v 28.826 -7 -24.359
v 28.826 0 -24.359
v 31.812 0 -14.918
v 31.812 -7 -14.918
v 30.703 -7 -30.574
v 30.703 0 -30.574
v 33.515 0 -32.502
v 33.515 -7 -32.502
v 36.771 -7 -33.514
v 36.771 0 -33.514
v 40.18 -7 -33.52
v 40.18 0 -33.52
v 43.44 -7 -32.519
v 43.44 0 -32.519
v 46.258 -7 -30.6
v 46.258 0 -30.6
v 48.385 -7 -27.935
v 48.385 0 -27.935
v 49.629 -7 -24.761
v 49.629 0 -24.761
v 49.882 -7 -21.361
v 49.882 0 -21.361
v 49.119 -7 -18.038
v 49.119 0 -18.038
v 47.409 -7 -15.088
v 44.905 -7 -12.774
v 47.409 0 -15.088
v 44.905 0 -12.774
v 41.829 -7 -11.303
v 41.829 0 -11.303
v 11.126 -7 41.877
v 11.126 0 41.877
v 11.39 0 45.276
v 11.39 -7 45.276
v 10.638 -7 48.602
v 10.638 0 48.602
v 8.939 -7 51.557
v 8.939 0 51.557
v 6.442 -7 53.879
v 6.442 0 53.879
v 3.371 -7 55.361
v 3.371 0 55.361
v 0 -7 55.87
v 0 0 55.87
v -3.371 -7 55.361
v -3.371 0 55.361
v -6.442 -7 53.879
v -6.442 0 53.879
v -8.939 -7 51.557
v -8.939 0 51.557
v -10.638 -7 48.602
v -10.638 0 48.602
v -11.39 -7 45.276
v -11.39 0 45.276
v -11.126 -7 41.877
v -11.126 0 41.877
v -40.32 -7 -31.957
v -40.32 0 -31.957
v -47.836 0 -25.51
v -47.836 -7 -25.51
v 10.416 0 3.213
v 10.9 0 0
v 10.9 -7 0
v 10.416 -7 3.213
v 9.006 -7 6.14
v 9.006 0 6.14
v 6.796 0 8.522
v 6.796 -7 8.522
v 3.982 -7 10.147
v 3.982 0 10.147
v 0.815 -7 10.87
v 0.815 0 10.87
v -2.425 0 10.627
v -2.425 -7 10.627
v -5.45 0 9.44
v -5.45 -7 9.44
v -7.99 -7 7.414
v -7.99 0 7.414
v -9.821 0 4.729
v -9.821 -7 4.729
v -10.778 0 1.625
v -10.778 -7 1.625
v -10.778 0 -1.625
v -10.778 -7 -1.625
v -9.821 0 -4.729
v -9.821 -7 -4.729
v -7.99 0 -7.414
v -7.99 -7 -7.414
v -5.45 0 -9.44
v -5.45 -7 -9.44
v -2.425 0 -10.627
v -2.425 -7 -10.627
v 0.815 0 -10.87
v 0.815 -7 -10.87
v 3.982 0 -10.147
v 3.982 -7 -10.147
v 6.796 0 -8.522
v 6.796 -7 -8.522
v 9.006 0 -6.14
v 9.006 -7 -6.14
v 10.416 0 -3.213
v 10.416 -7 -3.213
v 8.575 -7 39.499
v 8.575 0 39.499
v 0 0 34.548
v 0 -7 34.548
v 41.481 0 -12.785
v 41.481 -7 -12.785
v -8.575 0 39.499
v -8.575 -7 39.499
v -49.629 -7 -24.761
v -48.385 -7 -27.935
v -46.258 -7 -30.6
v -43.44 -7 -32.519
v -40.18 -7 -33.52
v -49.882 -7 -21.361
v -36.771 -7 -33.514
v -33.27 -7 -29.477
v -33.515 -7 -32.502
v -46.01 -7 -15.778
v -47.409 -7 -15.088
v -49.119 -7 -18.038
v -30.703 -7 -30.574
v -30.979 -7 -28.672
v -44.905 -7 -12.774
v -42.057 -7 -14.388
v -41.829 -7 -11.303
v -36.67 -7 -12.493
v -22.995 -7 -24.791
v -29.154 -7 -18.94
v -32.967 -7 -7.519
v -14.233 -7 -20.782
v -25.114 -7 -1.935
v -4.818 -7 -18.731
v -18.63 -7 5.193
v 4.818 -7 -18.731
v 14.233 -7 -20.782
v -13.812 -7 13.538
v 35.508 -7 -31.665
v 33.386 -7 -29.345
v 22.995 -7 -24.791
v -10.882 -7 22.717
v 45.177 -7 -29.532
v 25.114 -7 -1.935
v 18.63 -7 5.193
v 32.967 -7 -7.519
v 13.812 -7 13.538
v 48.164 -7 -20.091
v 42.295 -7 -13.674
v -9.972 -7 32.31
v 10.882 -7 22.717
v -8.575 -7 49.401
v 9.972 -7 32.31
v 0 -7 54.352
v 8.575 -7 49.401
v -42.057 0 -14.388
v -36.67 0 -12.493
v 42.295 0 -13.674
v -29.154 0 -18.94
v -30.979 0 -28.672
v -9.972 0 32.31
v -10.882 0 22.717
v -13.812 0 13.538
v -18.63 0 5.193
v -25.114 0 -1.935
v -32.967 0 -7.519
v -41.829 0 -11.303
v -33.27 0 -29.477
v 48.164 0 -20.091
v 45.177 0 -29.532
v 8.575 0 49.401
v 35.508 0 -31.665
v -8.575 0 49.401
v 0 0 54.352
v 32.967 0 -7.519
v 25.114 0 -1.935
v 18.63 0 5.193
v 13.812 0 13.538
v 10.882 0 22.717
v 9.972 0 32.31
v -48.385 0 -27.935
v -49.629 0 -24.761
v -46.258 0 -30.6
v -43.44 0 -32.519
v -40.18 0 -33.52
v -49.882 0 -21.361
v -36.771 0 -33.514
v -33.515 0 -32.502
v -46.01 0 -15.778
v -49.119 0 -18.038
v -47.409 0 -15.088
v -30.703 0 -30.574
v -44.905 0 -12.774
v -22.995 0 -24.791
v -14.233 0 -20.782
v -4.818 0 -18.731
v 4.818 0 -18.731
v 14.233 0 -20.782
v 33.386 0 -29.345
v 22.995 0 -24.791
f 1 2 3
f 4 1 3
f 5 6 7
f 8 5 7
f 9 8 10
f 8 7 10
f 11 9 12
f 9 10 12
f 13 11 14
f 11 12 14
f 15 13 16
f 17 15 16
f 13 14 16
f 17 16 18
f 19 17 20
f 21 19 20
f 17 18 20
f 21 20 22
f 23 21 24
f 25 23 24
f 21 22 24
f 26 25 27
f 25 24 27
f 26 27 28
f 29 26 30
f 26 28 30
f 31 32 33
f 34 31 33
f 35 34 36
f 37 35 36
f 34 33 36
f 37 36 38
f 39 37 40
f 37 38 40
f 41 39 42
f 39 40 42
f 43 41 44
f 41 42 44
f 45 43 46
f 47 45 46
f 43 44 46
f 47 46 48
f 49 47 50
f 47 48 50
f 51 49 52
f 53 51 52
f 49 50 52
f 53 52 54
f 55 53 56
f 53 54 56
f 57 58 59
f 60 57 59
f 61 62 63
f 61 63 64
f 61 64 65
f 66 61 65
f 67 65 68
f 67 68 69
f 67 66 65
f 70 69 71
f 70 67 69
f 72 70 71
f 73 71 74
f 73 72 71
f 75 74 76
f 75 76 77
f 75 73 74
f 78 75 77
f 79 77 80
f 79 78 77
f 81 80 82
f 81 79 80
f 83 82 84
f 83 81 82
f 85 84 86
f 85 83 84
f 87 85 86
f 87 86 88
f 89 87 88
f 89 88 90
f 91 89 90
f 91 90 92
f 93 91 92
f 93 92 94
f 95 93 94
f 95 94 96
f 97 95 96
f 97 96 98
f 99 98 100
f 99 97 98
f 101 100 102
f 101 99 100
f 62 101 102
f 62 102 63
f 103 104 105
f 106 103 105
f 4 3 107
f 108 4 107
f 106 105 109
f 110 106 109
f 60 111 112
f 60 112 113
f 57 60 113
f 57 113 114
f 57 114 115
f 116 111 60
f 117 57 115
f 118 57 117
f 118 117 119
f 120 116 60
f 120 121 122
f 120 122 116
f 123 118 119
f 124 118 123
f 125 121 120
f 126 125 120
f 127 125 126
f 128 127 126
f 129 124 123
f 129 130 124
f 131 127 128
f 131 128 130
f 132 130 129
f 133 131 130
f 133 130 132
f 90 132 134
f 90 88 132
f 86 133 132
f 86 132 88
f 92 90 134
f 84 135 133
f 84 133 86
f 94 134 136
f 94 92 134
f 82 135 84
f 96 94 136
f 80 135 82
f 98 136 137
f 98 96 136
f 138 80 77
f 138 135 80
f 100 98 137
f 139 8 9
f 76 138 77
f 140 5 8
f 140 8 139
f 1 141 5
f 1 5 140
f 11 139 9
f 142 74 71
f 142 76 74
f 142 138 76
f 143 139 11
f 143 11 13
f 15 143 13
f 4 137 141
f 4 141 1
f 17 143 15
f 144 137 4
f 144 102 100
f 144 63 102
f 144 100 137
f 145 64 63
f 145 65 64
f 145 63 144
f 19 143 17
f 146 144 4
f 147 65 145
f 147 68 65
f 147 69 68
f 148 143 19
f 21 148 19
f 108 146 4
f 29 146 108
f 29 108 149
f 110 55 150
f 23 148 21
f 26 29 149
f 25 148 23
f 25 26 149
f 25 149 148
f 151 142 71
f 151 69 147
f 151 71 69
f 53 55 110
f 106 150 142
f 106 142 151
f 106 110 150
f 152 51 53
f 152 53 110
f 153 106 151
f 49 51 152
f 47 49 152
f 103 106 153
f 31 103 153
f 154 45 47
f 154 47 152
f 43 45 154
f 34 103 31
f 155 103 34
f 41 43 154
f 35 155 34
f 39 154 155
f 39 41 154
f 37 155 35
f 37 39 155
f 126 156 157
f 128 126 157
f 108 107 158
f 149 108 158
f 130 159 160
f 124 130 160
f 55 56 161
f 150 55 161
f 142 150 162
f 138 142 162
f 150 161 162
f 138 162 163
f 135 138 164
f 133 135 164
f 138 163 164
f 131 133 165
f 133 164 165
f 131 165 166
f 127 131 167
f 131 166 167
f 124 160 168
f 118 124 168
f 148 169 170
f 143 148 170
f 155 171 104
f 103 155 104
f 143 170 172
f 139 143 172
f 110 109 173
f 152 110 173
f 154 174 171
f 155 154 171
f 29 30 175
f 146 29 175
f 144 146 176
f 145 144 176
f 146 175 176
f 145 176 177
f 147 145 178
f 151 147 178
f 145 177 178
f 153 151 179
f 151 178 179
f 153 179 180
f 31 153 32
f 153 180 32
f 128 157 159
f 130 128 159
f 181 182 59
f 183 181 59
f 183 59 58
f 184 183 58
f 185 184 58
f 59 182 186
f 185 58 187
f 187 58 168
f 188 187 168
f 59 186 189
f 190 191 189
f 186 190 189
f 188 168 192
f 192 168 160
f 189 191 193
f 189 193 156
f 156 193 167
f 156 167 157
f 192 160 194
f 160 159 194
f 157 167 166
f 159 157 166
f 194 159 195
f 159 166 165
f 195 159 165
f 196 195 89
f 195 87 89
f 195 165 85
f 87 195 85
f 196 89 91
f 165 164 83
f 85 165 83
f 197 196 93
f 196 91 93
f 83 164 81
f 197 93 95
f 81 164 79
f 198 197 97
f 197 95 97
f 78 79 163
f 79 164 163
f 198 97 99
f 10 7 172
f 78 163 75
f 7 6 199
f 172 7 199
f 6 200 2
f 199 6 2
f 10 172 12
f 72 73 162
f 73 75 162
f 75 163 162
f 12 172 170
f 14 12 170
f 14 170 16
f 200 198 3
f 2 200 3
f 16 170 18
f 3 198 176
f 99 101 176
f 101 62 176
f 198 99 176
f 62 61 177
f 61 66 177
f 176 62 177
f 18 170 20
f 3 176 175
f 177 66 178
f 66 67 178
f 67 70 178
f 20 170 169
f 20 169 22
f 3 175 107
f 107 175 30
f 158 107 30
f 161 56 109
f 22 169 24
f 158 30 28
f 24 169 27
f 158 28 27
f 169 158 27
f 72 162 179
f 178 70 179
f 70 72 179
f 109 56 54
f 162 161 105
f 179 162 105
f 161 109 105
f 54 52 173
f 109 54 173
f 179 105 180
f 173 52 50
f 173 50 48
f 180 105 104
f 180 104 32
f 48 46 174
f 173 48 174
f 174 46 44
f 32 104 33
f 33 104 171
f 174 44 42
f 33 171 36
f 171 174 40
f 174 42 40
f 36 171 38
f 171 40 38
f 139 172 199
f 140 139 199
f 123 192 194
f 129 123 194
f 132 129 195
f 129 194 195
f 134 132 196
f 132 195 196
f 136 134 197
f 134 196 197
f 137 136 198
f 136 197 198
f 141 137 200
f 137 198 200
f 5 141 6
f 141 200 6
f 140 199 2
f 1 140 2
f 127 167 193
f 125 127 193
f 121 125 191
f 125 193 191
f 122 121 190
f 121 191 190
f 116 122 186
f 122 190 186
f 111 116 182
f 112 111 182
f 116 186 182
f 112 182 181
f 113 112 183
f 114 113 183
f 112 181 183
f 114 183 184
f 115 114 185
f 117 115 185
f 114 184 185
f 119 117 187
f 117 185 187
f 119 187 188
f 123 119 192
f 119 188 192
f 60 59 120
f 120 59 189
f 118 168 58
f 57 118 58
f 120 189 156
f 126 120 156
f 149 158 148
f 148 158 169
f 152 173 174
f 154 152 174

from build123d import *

# Parameters (mm, degrees)
F0_R     = 10.9
F1_DEPTH = 7


with BuildPart() as f1:
    # F0 (on Front) → F1 (new body)
    with BuildSketch(Plane.XZ):
        with BuildLine():
            ThreePointArc((41.8292028353, -11.3029487912), (15.9973702481, 9.2360860191), (11.1259606268, 41.876626671))
            ThreePointArc((11.1259606268, 41.876626671), (0, 55.8696869554), (-11.1259606268, 41.876626671))
            ThreePointArc((-11.1259606268, 41.876626671), (-15.9973702481, 9.2360860191), (-41.8292028353, -11.3029487912))
            ThreePointArc((-41.8292028353, -11.3029487912), (-48.3845682049, -27.9348434777), (-30.7032422085, -30.5736778798))
            ThreePointArc((-30.7032422085, -30.5736778798), (0, -18.4721720382), (30.7032422085, -30.5736778798))
            ThreePointArc((30.7032422085, -30.5736778798), (48.3845682049, -27.9348434777), (41.8292028353, -11.3029487912))
        make_face()
        Polygon((-36.6695744207, -12.4931307895), (-29.1541558468, -18.9397824005), (-30.9794106244, -28.671651611), (-33.2699969614, -29.4772760306), (-40.3200839758, -31.9568692105), (-47.8355025496, -25.5102175995), (-46.010247772, -15.778348389), (-42.056981042, -14.3879409796), align=None, mode=Mode.SUBTRACT)
        Polygon((42.294572947, -13.6737558569), (48.1637383341, -20.0912171021), (45.1771939619, -29.5316294896), (35.508284826, -31.6654123875), (33.3864310519, -29.3453356023), (28.8259200623, -24.3587828979), (31.8124644346, -14.9183705104), (41.4813735704, -12.7845876125), align=None, mode=Mode.SUBTRACT)
        Circle(F0_R, mode=Mode.SUBTRACT)
        Polygon((0, 54.3515571166), (8.575, 49.4007785583), (8.575, 43.6150418434), (8.575, 39.4992214417), (0, 34.5484428834), (-8.575, 39.4992214417), (-8.575, 43.6150418434), (-8.575, 49.4007785583), align=None, mode=Mode.SUBTRACT)
    extrude(amount=F1_DEPTH)


solid = f1.part
